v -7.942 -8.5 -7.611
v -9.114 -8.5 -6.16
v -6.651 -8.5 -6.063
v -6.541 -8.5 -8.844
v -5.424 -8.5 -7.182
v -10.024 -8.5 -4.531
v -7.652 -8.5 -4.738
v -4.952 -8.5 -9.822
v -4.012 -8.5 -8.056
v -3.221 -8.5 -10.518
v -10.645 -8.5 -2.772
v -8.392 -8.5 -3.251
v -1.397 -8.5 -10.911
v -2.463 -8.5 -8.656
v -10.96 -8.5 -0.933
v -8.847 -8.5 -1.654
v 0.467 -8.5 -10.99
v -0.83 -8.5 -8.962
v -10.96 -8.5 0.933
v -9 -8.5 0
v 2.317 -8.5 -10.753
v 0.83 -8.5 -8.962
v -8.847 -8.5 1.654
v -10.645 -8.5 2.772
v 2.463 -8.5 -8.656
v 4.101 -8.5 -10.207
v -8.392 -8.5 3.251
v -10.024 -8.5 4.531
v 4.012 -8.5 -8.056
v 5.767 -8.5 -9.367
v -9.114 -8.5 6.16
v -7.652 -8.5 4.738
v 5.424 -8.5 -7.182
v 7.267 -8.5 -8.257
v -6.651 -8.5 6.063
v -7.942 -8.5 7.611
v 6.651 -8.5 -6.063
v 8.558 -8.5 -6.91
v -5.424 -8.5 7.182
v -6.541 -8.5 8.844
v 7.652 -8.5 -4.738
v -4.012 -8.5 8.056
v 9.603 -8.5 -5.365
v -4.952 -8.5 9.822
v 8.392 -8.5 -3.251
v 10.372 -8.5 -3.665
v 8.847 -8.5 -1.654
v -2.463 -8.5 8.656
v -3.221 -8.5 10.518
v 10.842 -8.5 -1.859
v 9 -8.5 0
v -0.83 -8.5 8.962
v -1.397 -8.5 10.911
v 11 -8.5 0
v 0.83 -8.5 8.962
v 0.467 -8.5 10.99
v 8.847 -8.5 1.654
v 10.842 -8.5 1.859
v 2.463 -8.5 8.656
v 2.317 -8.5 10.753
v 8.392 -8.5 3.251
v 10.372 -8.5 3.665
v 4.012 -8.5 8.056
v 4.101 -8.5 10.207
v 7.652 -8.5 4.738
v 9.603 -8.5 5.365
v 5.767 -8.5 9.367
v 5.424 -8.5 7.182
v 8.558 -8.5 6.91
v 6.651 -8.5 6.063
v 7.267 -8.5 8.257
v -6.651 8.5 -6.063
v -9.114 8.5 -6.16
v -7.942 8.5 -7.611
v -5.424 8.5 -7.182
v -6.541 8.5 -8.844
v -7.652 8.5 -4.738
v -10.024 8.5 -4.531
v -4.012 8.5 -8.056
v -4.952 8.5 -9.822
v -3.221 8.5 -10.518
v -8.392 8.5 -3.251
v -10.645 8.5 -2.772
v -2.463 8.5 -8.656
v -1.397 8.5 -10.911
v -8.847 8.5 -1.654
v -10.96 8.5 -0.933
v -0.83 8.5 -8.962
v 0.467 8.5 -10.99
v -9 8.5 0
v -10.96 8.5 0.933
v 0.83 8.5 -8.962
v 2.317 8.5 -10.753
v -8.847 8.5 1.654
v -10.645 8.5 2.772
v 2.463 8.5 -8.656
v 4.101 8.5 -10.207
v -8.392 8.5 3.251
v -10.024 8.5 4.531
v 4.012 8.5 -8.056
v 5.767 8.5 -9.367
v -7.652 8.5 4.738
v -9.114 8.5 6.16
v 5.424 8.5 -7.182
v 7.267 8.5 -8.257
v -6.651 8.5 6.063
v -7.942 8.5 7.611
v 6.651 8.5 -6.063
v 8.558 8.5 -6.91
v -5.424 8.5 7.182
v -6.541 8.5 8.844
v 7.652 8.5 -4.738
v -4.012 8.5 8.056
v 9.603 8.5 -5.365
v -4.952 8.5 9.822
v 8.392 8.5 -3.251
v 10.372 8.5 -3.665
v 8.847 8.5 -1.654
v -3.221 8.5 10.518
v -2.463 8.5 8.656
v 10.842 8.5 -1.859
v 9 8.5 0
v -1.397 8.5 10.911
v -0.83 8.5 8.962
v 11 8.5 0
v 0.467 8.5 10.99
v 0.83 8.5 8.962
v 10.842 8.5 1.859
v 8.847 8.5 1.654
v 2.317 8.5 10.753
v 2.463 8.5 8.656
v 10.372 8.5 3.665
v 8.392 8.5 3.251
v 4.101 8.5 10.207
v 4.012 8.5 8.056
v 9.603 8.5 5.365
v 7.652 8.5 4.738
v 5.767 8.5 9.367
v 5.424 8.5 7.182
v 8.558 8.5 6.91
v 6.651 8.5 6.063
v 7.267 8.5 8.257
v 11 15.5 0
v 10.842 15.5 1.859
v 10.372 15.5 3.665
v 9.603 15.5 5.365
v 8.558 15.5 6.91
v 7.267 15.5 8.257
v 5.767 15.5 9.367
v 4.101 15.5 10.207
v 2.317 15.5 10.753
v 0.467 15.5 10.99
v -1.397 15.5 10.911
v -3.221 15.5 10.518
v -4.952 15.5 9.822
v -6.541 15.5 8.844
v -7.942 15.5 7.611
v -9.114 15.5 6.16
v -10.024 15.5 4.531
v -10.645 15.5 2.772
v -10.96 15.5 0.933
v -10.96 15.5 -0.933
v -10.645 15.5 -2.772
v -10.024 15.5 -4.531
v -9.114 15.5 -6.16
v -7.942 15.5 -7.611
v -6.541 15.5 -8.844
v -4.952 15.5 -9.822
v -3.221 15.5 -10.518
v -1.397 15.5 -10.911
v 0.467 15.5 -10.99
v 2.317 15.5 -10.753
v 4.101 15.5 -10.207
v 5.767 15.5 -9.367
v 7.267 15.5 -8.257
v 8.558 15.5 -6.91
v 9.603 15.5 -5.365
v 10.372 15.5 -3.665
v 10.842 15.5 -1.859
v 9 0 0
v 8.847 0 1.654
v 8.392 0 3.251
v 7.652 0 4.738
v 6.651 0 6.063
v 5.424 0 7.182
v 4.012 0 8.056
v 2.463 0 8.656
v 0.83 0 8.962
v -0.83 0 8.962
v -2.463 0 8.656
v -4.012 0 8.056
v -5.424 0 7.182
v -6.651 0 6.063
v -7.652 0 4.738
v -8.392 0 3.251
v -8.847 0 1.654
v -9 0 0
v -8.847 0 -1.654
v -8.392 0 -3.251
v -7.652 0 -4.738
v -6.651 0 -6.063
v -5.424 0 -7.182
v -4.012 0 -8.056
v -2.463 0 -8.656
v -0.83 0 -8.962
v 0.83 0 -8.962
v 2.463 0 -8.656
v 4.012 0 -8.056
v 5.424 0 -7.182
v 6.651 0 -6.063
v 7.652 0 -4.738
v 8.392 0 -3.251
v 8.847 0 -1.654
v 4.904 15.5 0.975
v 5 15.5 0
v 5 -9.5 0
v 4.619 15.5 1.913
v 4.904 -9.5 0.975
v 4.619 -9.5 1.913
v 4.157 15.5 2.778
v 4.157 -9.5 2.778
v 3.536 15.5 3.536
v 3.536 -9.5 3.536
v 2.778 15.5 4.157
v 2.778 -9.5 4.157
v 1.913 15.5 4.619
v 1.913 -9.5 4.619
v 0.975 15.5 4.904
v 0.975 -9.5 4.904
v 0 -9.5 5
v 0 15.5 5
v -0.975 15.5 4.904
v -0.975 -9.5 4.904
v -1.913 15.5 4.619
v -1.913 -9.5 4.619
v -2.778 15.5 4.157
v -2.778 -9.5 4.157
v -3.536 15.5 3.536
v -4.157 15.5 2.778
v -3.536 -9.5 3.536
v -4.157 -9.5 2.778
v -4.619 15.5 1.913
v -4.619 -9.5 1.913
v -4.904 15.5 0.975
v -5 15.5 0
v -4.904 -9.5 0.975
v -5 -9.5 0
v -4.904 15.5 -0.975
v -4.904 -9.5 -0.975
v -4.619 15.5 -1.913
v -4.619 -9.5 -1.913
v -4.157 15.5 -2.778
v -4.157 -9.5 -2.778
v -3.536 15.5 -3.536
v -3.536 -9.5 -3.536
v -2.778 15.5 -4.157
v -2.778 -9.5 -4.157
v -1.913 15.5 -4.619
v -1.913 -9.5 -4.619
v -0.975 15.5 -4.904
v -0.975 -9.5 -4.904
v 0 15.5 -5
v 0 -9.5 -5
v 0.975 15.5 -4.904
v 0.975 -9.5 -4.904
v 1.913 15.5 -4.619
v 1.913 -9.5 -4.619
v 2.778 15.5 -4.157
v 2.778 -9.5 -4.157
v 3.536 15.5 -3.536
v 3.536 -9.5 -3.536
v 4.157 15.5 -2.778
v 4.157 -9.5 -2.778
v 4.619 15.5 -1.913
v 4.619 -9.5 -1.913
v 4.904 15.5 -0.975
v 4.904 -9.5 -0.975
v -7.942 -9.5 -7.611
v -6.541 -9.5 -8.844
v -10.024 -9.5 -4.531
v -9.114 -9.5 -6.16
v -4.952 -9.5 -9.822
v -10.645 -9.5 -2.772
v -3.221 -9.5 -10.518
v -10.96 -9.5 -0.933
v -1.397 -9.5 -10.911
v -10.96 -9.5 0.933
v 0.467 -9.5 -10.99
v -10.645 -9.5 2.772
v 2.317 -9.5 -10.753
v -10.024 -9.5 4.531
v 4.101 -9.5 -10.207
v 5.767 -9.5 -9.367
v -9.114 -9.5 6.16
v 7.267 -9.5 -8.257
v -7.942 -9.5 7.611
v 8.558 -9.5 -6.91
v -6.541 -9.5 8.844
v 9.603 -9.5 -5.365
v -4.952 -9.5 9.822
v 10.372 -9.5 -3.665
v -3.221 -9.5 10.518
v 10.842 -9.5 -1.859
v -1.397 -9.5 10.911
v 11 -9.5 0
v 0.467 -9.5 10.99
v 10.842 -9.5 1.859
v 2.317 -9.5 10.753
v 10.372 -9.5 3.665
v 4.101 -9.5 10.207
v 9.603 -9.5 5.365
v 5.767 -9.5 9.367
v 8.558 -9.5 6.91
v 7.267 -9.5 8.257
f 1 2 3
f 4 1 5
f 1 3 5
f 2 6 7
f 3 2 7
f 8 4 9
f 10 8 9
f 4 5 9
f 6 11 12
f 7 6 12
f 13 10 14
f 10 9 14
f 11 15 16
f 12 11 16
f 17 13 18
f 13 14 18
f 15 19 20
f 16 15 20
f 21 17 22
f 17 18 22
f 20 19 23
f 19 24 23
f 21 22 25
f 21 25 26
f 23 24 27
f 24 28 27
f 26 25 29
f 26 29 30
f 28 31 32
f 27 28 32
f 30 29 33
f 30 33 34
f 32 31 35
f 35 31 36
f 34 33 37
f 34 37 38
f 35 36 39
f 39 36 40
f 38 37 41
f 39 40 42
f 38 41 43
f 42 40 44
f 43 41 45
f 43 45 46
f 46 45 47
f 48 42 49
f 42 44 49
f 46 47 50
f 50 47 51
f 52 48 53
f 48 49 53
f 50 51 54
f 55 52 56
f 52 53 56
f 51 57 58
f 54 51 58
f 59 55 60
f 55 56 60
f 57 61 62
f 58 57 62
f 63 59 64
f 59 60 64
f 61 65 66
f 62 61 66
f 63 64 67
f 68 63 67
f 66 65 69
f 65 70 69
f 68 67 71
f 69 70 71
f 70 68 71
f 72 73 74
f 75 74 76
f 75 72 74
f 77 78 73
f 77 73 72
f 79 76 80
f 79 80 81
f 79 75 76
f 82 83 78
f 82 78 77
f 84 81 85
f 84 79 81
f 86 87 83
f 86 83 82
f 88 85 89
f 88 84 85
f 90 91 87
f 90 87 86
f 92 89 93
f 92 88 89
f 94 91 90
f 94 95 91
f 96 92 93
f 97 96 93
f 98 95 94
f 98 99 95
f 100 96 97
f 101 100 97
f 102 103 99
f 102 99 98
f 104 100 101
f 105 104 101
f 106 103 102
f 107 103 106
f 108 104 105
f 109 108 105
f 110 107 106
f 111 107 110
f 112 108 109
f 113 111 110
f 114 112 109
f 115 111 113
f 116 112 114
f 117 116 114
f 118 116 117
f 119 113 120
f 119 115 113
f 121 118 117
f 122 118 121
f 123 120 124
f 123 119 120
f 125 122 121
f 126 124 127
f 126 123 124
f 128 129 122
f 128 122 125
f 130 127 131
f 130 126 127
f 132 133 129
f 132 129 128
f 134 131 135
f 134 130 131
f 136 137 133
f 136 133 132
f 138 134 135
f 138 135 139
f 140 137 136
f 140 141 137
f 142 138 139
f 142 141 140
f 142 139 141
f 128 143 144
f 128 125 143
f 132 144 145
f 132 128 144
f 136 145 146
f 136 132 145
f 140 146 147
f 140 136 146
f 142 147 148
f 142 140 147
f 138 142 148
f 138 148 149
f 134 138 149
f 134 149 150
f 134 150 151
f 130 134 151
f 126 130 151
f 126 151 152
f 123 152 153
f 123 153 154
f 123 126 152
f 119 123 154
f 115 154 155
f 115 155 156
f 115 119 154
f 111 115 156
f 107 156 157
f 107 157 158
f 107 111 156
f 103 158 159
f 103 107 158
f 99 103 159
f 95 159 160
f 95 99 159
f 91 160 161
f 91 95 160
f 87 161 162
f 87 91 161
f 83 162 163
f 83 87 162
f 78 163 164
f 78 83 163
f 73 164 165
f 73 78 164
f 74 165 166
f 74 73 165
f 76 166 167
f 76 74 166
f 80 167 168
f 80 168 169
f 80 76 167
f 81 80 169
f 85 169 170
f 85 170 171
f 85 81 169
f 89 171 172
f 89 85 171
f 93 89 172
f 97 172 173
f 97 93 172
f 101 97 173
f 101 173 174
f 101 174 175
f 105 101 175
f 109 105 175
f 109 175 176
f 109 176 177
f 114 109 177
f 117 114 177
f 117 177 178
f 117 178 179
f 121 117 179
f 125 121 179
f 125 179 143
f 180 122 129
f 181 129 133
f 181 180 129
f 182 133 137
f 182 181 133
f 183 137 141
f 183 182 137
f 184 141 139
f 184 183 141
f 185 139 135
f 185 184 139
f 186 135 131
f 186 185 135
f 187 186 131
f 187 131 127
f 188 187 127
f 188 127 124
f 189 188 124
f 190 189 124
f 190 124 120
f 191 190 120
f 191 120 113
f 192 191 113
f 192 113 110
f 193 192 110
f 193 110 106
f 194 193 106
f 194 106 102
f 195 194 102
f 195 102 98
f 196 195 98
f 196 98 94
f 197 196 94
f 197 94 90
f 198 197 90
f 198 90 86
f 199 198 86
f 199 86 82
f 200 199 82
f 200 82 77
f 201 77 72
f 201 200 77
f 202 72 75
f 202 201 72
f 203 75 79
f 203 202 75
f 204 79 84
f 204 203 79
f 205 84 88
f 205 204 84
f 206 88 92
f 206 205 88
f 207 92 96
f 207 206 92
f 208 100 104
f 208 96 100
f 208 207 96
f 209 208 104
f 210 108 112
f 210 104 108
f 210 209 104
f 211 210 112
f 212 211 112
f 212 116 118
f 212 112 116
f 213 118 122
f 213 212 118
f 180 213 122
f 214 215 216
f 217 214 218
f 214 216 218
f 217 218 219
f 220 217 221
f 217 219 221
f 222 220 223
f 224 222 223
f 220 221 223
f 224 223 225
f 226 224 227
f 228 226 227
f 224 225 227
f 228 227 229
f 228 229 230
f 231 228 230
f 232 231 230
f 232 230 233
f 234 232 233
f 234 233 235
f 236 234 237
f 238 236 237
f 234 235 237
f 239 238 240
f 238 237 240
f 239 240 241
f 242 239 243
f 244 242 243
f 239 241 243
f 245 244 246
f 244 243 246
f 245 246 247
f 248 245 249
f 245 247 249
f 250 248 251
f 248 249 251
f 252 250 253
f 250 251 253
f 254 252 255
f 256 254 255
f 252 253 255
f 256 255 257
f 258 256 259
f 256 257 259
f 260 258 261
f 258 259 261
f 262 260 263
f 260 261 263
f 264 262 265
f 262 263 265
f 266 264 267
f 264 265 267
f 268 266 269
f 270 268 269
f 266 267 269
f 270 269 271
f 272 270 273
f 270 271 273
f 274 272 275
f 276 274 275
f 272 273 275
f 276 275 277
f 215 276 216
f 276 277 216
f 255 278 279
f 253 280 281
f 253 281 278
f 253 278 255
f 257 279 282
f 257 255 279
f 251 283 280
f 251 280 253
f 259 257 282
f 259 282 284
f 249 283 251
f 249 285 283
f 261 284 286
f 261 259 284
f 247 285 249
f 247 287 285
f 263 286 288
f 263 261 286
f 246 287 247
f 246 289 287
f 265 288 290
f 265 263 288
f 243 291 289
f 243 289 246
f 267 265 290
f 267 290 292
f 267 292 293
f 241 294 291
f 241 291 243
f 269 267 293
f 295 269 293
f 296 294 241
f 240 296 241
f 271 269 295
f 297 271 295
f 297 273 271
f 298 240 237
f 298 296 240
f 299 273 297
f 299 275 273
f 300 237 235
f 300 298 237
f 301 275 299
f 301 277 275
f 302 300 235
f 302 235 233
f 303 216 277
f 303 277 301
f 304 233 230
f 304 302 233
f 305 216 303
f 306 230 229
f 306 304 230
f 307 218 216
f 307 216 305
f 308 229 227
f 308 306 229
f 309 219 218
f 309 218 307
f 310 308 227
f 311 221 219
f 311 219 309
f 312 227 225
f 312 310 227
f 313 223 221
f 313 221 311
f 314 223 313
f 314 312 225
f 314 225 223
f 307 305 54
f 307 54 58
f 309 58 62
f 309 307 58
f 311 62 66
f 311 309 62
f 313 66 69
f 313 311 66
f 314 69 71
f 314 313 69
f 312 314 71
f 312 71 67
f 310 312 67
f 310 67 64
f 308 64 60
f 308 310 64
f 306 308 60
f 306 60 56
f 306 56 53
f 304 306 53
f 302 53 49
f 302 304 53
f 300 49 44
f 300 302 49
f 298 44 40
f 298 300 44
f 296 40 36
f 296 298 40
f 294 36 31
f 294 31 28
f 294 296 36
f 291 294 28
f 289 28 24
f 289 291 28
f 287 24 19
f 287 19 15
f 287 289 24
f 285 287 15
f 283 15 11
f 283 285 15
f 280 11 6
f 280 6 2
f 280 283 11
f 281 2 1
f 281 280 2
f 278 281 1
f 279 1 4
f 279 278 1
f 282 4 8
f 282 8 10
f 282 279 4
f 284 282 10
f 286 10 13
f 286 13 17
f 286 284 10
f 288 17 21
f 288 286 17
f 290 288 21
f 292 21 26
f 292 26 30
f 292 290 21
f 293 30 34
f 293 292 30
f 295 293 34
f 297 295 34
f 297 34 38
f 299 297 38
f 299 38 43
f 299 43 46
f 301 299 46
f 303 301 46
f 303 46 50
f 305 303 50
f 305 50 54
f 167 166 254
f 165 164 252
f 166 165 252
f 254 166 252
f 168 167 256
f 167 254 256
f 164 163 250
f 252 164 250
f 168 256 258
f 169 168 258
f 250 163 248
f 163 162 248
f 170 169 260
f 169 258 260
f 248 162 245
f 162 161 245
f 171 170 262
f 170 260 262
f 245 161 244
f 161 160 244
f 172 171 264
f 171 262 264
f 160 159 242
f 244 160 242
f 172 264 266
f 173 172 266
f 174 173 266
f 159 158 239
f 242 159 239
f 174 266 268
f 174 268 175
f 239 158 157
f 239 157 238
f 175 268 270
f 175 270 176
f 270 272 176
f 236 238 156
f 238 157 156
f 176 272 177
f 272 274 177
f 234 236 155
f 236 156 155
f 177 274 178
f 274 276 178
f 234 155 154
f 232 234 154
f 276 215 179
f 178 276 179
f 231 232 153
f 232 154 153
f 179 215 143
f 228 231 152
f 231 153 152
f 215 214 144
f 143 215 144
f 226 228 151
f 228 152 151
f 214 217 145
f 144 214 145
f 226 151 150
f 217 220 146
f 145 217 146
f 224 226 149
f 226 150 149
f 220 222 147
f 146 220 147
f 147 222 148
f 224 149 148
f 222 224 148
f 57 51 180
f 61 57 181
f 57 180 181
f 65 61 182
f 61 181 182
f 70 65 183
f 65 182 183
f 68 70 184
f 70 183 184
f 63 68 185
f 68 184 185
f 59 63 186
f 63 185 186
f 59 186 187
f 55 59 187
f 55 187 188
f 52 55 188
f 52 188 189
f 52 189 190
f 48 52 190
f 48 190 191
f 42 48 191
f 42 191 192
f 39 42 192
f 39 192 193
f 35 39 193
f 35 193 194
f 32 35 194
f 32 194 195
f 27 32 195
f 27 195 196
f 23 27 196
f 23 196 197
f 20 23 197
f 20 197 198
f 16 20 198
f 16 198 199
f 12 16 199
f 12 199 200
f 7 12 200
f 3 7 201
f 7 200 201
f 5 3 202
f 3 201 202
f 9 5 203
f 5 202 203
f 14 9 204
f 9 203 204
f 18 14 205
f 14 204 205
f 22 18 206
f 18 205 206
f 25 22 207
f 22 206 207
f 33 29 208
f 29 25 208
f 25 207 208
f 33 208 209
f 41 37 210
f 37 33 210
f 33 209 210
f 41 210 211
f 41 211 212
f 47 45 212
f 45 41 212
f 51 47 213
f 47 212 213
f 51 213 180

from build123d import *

# Parameters (mm, degrees)
F0_R     = 9
F1_DEPTH = 9.5
F2_R     = 11
F3_DEPTH = 1
F5_DEPTH = 6
F6_R     = 5
F7_DEPTH = 25


with BuildPart() as f1:
    # F0 (on Front) → F1 (new body)
    with BuildSketch(Plane.XZ):
        Circle(F0_R)
    extrude(amount=F1_DEPTH)

    # F2 (on face) → F3 (join)
    with BuildSketch(Plane.XZ.offset(9.5)):
        Circle(F2_R)
    extrude(amount=-F3_DEPTH)

    # F4: F1 across plane


with BuildPart() as f1_1:
    add(f1.part)
    add(f1.part.mirror(Plane.XZ))

    # F5 (add): a face of the model
    f5_faces = [f1_1.faces().sort_by_distance(p)[0] for p in [
        (0, 9.5, 0),
    ]]
    extrude(f5_faces, amount=F5_DEPTH)

    # F6 (on face) → F7 (cut)
    with BuildSketch(Plane.XZ.offset(9.5)):
        Circle(F6_R)
    extrude(amount=-F7_DEPTH, mode=Mode.SUBTRACT)


solid = f1_1.part
